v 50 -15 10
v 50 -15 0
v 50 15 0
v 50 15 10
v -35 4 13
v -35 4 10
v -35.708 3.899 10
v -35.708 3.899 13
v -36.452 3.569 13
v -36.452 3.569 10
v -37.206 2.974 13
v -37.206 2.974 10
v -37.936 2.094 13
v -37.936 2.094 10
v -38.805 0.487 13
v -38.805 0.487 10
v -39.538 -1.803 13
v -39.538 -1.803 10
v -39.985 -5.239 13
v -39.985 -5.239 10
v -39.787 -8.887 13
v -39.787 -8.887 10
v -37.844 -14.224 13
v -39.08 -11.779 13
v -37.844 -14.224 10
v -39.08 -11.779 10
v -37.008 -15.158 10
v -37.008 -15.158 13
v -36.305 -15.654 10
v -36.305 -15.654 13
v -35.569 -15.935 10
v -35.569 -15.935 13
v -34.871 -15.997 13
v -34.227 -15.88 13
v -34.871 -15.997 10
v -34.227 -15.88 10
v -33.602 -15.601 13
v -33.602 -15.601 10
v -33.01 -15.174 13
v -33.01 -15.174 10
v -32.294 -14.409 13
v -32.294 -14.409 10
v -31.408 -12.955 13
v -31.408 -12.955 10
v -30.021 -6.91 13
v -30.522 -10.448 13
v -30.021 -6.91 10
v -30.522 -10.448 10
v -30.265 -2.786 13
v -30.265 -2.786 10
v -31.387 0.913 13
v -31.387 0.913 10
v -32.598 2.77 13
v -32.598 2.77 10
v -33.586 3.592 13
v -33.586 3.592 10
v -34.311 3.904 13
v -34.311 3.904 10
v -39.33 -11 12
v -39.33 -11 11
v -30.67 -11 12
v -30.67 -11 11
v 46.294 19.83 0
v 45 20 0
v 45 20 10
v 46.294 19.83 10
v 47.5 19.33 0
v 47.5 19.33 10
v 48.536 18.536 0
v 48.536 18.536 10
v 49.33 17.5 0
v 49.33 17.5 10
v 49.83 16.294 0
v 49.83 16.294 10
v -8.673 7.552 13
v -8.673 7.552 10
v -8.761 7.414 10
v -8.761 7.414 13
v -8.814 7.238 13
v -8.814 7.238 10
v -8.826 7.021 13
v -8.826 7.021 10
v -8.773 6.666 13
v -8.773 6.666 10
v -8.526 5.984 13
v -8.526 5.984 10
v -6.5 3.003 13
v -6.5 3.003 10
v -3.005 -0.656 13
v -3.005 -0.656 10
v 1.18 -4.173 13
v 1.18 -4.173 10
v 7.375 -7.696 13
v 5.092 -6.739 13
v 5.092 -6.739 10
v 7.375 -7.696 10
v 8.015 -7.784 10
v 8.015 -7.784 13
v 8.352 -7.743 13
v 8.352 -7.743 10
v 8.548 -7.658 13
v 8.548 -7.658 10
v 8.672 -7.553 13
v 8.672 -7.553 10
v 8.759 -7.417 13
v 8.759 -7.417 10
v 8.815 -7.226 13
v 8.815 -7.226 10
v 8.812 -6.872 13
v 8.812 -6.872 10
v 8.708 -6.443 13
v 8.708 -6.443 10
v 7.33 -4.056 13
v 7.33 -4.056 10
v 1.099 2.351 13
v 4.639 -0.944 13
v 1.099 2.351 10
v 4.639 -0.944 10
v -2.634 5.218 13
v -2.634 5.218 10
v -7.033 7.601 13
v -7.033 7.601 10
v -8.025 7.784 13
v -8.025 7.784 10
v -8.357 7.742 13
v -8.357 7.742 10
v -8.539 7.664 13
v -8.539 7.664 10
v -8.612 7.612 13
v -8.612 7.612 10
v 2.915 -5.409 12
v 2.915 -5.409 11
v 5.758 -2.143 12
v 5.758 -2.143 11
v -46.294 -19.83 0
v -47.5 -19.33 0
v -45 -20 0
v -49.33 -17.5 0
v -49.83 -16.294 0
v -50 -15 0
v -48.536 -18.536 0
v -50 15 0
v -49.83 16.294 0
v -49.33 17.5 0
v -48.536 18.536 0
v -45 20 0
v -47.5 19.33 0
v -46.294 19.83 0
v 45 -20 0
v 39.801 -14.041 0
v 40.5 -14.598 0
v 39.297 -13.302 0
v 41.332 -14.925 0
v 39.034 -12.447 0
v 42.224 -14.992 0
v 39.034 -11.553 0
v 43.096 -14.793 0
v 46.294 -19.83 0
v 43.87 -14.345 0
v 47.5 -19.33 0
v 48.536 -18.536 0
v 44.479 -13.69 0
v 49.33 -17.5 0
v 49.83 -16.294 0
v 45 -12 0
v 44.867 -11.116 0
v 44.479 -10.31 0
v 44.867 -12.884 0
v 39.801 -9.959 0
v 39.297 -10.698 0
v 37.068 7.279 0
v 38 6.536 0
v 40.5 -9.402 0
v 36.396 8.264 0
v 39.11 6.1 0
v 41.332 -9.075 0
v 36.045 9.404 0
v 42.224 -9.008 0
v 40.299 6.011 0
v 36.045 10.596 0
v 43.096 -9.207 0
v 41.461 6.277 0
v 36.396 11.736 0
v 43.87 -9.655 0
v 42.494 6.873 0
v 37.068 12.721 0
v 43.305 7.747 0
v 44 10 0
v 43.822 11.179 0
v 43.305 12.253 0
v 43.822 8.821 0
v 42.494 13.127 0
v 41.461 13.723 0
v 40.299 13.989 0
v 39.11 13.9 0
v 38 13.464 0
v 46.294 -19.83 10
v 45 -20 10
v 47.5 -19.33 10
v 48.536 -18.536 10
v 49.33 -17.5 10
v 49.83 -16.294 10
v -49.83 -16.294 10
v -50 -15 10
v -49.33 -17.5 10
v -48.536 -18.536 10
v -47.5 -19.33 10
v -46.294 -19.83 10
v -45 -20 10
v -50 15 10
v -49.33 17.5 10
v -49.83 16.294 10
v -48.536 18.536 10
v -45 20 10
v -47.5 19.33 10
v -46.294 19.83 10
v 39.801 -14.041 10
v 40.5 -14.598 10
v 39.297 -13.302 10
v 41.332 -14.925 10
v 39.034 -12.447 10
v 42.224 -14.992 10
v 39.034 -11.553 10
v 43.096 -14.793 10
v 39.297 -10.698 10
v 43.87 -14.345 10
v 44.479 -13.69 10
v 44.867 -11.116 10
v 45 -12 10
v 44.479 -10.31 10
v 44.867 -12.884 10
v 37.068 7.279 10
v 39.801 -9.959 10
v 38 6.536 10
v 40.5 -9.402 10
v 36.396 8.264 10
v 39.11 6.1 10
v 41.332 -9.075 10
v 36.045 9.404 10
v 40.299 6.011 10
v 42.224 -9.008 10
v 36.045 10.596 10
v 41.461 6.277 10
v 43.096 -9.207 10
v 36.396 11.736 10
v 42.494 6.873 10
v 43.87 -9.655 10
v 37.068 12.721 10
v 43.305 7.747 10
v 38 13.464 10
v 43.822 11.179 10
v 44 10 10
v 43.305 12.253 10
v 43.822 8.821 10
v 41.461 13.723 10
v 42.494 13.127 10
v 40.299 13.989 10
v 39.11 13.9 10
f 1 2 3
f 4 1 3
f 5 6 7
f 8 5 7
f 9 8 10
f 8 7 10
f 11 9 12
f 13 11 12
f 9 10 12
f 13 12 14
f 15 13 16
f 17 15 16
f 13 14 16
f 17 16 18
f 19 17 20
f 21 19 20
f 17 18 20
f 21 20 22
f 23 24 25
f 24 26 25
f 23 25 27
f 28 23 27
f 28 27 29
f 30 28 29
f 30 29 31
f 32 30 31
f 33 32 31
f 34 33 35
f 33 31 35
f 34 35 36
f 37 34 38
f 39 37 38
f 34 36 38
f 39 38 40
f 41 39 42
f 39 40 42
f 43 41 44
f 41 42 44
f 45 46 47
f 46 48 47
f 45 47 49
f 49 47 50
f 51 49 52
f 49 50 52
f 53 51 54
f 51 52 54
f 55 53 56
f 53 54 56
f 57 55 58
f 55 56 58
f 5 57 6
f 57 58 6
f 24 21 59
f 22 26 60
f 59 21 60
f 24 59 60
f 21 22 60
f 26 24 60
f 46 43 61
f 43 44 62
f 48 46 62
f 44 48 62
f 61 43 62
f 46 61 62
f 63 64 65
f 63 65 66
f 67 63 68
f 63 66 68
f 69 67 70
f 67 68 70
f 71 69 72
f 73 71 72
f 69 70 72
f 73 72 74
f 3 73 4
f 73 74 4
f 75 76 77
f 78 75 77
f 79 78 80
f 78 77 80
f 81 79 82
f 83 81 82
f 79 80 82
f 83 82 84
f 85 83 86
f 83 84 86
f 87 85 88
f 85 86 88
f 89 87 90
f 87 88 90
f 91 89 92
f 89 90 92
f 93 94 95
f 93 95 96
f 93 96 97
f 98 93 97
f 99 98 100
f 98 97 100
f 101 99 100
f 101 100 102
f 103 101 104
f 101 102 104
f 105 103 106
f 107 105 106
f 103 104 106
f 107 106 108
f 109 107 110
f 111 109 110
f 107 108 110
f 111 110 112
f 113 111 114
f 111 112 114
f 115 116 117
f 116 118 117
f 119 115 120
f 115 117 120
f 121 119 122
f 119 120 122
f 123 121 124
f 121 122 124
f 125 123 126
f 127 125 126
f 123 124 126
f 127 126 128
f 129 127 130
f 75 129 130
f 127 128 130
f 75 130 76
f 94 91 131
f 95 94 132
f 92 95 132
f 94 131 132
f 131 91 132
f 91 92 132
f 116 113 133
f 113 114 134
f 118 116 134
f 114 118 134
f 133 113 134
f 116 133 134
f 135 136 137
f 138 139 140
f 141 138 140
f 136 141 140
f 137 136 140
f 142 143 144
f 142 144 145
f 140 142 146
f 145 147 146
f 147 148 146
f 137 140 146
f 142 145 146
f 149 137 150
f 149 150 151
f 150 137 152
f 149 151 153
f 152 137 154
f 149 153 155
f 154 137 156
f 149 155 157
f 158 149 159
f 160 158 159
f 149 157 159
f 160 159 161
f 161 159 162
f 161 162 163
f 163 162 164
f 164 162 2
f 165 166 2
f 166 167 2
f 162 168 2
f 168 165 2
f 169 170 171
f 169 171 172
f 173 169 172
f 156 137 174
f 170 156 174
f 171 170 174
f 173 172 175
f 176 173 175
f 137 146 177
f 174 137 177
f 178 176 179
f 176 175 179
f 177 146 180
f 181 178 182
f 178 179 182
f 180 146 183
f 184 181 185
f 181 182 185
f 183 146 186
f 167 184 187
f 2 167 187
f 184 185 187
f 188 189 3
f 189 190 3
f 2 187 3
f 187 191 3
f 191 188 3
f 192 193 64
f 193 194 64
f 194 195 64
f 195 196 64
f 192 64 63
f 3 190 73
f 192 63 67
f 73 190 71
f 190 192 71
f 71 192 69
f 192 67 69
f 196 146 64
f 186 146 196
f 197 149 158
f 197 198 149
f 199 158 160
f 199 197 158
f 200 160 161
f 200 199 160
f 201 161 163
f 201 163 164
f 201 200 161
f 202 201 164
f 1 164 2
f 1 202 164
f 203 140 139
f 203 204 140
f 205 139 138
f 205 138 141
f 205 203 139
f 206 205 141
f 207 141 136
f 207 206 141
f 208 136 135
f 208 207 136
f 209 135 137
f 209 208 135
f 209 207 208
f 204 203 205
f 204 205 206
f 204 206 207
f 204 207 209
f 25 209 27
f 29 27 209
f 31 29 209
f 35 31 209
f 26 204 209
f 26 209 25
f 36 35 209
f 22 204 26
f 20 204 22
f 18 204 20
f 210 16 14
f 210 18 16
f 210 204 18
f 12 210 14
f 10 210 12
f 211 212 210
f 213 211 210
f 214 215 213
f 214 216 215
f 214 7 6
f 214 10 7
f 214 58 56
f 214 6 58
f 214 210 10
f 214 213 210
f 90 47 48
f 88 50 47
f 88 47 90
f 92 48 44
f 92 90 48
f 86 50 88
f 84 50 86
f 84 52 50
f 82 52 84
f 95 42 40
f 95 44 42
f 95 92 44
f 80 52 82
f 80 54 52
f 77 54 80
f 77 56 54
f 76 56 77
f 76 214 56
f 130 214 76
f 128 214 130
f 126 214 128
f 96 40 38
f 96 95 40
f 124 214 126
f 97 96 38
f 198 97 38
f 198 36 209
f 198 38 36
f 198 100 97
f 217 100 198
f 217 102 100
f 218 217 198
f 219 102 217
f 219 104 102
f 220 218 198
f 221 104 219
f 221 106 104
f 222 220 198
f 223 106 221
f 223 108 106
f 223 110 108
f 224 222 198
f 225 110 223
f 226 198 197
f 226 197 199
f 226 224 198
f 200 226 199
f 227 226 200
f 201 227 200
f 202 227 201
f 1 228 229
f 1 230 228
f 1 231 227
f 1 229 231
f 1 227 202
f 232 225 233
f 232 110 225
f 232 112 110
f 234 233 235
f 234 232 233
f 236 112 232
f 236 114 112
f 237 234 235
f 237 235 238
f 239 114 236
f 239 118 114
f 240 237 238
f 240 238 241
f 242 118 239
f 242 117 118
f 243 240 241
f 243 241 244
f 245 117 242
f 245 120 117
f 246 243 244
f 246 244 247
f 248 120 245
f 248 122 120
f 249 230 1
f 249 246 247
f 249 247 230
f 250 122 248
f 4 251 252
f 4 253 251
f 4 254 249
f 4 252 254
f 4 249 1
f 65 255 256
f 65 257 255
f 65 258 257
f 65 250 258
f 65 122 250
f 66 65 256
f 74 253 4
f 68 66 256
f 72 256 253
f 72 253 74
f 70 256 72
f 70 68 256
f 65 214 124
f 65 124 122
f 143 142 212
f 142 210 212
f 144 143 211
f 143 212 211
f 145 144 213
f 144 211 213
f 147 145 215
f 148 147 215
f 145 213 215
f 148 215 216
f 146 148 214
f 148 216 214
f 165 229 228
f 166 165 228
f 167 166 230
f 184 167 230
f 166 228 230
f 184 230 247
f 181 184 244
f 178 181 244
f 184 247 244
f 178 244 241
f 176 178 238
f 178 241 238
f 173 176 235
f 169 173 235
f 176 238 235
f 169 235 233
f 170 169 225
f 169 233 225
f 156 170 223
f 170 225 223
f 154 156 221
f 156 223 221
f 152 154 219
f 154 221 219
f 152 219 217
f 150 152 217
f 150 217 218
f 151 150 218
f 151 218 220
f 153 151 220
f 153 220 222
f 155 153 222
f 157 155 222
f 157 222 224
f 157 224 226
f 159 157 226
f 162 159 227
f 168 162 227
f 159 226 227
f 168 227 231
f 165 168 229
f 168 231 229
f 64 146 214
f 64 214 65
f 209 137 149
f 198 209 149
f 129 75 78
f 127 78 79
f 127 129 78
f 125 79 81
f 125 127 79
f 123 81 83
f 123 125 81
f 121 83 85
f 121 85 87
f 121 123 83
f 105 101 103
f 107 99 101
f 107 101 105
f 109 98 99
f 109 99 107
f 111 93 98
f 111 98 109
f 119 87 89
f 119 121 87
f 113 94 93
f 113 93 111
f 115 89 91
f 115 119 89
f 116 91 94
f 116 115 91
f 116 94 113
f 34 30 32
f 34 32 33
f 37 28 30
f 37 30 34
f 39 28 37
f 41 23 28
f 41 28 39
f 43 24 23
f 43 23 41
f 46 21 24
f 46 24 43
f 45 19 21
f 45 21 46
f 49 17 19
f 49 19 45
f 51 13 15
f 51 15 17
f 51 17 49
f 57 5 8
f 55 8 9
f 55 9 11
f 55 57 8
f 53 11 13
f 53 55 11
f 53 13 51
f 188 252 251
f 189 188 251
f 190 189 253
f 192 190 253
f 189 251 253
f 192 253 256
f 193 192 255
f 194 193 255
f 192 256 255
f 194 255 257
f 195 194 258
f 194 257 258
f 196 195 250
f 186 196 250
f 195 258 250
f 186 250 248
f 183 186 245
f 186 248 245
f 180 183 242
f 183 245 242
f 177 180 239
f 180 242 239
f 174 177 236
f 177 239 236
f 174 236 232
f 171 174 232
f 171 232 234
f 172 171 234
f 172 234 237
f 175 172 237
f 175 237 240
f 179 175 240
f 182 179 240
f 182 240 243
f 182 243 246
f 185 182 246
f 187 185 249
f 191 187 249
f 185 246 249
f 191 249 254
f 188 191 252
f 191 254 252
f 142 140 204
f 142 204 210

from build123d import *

# Parameters (mm, degrees)
F0_W     = 100
F0_H     = 40
F1_DEPTH = 10
F3_DEPTH = 3
F4_R     = 4
F4_R_2   = 3
F5_DEPTH = 10
F6_R     = 5


with BuildPart() as f1:
    # F0 (on Top) → F1 (new body)
    with BuildSketch(Plane.XY):
        Rectangle(F0_W, F0_H)
    extrude(amount=F1_DEPTH)

    # F2 (on face) → F3 (join)
    with BuildSketch(Plane.XY.offset(10)):
        with BuildLine():
            add(Edge.make_bspline(
                [(-35, 4), (-43.660254, 4), (-39.330127, -11), (-35, -26), (-30.669873, -11), (-26.339746, 4), (-35, 4)],
                knots=[0, 0, 0, 2.094395, 2.094395, 4.18879, 4.18879, 6.283185, 6.283185, 6.283185], degree=2, weights=[1, 0.5, 1, 0.5, 1, 0.5, 1]))
        make_face()
        with BuildLine():
            add(Edge.make_bspline(
                [(-8.672845, 7.551938), (-11.516397, 4.286327), (2.914646, -5.408774), (17.345689, -15.103876), (5.758198, -2.143164), (-5.829292, 10.817548), (-8.672845, 7.551938)],
                knots=[0, 0, 0, 2.094395, 2.094395, 4.18879, 4.18879, 6.283185, 6.283185, 6.283185], degree=2, weights=[1, 0.5, 1, 0.5, 1, 0.5, 1]))
        make_face()
    extrude(amount=F3_DEPTH)

    # F4 (on face) → F5 (cut)
    with BuildSketch(Plane.XY.offset(10)):
        with Locations((40, 10)):
            Circle(F4_R)
        with Locations((42, -12)):
            Circle(F4_R_2)
    extrude(amount=-F5_DEPTH, mode=Mode.SUBTRACT)

    # F6
    f6_edges = [f1.edges().sort_by_distance(p)[0] for p in [
        (-50, -20, 5),
        (-50, 20, 5),
        (50, 20, 5),
        (50, -20, 5),
    ]]
    fillet(f6_edges, radius=F6_R)


solid = f1.part
